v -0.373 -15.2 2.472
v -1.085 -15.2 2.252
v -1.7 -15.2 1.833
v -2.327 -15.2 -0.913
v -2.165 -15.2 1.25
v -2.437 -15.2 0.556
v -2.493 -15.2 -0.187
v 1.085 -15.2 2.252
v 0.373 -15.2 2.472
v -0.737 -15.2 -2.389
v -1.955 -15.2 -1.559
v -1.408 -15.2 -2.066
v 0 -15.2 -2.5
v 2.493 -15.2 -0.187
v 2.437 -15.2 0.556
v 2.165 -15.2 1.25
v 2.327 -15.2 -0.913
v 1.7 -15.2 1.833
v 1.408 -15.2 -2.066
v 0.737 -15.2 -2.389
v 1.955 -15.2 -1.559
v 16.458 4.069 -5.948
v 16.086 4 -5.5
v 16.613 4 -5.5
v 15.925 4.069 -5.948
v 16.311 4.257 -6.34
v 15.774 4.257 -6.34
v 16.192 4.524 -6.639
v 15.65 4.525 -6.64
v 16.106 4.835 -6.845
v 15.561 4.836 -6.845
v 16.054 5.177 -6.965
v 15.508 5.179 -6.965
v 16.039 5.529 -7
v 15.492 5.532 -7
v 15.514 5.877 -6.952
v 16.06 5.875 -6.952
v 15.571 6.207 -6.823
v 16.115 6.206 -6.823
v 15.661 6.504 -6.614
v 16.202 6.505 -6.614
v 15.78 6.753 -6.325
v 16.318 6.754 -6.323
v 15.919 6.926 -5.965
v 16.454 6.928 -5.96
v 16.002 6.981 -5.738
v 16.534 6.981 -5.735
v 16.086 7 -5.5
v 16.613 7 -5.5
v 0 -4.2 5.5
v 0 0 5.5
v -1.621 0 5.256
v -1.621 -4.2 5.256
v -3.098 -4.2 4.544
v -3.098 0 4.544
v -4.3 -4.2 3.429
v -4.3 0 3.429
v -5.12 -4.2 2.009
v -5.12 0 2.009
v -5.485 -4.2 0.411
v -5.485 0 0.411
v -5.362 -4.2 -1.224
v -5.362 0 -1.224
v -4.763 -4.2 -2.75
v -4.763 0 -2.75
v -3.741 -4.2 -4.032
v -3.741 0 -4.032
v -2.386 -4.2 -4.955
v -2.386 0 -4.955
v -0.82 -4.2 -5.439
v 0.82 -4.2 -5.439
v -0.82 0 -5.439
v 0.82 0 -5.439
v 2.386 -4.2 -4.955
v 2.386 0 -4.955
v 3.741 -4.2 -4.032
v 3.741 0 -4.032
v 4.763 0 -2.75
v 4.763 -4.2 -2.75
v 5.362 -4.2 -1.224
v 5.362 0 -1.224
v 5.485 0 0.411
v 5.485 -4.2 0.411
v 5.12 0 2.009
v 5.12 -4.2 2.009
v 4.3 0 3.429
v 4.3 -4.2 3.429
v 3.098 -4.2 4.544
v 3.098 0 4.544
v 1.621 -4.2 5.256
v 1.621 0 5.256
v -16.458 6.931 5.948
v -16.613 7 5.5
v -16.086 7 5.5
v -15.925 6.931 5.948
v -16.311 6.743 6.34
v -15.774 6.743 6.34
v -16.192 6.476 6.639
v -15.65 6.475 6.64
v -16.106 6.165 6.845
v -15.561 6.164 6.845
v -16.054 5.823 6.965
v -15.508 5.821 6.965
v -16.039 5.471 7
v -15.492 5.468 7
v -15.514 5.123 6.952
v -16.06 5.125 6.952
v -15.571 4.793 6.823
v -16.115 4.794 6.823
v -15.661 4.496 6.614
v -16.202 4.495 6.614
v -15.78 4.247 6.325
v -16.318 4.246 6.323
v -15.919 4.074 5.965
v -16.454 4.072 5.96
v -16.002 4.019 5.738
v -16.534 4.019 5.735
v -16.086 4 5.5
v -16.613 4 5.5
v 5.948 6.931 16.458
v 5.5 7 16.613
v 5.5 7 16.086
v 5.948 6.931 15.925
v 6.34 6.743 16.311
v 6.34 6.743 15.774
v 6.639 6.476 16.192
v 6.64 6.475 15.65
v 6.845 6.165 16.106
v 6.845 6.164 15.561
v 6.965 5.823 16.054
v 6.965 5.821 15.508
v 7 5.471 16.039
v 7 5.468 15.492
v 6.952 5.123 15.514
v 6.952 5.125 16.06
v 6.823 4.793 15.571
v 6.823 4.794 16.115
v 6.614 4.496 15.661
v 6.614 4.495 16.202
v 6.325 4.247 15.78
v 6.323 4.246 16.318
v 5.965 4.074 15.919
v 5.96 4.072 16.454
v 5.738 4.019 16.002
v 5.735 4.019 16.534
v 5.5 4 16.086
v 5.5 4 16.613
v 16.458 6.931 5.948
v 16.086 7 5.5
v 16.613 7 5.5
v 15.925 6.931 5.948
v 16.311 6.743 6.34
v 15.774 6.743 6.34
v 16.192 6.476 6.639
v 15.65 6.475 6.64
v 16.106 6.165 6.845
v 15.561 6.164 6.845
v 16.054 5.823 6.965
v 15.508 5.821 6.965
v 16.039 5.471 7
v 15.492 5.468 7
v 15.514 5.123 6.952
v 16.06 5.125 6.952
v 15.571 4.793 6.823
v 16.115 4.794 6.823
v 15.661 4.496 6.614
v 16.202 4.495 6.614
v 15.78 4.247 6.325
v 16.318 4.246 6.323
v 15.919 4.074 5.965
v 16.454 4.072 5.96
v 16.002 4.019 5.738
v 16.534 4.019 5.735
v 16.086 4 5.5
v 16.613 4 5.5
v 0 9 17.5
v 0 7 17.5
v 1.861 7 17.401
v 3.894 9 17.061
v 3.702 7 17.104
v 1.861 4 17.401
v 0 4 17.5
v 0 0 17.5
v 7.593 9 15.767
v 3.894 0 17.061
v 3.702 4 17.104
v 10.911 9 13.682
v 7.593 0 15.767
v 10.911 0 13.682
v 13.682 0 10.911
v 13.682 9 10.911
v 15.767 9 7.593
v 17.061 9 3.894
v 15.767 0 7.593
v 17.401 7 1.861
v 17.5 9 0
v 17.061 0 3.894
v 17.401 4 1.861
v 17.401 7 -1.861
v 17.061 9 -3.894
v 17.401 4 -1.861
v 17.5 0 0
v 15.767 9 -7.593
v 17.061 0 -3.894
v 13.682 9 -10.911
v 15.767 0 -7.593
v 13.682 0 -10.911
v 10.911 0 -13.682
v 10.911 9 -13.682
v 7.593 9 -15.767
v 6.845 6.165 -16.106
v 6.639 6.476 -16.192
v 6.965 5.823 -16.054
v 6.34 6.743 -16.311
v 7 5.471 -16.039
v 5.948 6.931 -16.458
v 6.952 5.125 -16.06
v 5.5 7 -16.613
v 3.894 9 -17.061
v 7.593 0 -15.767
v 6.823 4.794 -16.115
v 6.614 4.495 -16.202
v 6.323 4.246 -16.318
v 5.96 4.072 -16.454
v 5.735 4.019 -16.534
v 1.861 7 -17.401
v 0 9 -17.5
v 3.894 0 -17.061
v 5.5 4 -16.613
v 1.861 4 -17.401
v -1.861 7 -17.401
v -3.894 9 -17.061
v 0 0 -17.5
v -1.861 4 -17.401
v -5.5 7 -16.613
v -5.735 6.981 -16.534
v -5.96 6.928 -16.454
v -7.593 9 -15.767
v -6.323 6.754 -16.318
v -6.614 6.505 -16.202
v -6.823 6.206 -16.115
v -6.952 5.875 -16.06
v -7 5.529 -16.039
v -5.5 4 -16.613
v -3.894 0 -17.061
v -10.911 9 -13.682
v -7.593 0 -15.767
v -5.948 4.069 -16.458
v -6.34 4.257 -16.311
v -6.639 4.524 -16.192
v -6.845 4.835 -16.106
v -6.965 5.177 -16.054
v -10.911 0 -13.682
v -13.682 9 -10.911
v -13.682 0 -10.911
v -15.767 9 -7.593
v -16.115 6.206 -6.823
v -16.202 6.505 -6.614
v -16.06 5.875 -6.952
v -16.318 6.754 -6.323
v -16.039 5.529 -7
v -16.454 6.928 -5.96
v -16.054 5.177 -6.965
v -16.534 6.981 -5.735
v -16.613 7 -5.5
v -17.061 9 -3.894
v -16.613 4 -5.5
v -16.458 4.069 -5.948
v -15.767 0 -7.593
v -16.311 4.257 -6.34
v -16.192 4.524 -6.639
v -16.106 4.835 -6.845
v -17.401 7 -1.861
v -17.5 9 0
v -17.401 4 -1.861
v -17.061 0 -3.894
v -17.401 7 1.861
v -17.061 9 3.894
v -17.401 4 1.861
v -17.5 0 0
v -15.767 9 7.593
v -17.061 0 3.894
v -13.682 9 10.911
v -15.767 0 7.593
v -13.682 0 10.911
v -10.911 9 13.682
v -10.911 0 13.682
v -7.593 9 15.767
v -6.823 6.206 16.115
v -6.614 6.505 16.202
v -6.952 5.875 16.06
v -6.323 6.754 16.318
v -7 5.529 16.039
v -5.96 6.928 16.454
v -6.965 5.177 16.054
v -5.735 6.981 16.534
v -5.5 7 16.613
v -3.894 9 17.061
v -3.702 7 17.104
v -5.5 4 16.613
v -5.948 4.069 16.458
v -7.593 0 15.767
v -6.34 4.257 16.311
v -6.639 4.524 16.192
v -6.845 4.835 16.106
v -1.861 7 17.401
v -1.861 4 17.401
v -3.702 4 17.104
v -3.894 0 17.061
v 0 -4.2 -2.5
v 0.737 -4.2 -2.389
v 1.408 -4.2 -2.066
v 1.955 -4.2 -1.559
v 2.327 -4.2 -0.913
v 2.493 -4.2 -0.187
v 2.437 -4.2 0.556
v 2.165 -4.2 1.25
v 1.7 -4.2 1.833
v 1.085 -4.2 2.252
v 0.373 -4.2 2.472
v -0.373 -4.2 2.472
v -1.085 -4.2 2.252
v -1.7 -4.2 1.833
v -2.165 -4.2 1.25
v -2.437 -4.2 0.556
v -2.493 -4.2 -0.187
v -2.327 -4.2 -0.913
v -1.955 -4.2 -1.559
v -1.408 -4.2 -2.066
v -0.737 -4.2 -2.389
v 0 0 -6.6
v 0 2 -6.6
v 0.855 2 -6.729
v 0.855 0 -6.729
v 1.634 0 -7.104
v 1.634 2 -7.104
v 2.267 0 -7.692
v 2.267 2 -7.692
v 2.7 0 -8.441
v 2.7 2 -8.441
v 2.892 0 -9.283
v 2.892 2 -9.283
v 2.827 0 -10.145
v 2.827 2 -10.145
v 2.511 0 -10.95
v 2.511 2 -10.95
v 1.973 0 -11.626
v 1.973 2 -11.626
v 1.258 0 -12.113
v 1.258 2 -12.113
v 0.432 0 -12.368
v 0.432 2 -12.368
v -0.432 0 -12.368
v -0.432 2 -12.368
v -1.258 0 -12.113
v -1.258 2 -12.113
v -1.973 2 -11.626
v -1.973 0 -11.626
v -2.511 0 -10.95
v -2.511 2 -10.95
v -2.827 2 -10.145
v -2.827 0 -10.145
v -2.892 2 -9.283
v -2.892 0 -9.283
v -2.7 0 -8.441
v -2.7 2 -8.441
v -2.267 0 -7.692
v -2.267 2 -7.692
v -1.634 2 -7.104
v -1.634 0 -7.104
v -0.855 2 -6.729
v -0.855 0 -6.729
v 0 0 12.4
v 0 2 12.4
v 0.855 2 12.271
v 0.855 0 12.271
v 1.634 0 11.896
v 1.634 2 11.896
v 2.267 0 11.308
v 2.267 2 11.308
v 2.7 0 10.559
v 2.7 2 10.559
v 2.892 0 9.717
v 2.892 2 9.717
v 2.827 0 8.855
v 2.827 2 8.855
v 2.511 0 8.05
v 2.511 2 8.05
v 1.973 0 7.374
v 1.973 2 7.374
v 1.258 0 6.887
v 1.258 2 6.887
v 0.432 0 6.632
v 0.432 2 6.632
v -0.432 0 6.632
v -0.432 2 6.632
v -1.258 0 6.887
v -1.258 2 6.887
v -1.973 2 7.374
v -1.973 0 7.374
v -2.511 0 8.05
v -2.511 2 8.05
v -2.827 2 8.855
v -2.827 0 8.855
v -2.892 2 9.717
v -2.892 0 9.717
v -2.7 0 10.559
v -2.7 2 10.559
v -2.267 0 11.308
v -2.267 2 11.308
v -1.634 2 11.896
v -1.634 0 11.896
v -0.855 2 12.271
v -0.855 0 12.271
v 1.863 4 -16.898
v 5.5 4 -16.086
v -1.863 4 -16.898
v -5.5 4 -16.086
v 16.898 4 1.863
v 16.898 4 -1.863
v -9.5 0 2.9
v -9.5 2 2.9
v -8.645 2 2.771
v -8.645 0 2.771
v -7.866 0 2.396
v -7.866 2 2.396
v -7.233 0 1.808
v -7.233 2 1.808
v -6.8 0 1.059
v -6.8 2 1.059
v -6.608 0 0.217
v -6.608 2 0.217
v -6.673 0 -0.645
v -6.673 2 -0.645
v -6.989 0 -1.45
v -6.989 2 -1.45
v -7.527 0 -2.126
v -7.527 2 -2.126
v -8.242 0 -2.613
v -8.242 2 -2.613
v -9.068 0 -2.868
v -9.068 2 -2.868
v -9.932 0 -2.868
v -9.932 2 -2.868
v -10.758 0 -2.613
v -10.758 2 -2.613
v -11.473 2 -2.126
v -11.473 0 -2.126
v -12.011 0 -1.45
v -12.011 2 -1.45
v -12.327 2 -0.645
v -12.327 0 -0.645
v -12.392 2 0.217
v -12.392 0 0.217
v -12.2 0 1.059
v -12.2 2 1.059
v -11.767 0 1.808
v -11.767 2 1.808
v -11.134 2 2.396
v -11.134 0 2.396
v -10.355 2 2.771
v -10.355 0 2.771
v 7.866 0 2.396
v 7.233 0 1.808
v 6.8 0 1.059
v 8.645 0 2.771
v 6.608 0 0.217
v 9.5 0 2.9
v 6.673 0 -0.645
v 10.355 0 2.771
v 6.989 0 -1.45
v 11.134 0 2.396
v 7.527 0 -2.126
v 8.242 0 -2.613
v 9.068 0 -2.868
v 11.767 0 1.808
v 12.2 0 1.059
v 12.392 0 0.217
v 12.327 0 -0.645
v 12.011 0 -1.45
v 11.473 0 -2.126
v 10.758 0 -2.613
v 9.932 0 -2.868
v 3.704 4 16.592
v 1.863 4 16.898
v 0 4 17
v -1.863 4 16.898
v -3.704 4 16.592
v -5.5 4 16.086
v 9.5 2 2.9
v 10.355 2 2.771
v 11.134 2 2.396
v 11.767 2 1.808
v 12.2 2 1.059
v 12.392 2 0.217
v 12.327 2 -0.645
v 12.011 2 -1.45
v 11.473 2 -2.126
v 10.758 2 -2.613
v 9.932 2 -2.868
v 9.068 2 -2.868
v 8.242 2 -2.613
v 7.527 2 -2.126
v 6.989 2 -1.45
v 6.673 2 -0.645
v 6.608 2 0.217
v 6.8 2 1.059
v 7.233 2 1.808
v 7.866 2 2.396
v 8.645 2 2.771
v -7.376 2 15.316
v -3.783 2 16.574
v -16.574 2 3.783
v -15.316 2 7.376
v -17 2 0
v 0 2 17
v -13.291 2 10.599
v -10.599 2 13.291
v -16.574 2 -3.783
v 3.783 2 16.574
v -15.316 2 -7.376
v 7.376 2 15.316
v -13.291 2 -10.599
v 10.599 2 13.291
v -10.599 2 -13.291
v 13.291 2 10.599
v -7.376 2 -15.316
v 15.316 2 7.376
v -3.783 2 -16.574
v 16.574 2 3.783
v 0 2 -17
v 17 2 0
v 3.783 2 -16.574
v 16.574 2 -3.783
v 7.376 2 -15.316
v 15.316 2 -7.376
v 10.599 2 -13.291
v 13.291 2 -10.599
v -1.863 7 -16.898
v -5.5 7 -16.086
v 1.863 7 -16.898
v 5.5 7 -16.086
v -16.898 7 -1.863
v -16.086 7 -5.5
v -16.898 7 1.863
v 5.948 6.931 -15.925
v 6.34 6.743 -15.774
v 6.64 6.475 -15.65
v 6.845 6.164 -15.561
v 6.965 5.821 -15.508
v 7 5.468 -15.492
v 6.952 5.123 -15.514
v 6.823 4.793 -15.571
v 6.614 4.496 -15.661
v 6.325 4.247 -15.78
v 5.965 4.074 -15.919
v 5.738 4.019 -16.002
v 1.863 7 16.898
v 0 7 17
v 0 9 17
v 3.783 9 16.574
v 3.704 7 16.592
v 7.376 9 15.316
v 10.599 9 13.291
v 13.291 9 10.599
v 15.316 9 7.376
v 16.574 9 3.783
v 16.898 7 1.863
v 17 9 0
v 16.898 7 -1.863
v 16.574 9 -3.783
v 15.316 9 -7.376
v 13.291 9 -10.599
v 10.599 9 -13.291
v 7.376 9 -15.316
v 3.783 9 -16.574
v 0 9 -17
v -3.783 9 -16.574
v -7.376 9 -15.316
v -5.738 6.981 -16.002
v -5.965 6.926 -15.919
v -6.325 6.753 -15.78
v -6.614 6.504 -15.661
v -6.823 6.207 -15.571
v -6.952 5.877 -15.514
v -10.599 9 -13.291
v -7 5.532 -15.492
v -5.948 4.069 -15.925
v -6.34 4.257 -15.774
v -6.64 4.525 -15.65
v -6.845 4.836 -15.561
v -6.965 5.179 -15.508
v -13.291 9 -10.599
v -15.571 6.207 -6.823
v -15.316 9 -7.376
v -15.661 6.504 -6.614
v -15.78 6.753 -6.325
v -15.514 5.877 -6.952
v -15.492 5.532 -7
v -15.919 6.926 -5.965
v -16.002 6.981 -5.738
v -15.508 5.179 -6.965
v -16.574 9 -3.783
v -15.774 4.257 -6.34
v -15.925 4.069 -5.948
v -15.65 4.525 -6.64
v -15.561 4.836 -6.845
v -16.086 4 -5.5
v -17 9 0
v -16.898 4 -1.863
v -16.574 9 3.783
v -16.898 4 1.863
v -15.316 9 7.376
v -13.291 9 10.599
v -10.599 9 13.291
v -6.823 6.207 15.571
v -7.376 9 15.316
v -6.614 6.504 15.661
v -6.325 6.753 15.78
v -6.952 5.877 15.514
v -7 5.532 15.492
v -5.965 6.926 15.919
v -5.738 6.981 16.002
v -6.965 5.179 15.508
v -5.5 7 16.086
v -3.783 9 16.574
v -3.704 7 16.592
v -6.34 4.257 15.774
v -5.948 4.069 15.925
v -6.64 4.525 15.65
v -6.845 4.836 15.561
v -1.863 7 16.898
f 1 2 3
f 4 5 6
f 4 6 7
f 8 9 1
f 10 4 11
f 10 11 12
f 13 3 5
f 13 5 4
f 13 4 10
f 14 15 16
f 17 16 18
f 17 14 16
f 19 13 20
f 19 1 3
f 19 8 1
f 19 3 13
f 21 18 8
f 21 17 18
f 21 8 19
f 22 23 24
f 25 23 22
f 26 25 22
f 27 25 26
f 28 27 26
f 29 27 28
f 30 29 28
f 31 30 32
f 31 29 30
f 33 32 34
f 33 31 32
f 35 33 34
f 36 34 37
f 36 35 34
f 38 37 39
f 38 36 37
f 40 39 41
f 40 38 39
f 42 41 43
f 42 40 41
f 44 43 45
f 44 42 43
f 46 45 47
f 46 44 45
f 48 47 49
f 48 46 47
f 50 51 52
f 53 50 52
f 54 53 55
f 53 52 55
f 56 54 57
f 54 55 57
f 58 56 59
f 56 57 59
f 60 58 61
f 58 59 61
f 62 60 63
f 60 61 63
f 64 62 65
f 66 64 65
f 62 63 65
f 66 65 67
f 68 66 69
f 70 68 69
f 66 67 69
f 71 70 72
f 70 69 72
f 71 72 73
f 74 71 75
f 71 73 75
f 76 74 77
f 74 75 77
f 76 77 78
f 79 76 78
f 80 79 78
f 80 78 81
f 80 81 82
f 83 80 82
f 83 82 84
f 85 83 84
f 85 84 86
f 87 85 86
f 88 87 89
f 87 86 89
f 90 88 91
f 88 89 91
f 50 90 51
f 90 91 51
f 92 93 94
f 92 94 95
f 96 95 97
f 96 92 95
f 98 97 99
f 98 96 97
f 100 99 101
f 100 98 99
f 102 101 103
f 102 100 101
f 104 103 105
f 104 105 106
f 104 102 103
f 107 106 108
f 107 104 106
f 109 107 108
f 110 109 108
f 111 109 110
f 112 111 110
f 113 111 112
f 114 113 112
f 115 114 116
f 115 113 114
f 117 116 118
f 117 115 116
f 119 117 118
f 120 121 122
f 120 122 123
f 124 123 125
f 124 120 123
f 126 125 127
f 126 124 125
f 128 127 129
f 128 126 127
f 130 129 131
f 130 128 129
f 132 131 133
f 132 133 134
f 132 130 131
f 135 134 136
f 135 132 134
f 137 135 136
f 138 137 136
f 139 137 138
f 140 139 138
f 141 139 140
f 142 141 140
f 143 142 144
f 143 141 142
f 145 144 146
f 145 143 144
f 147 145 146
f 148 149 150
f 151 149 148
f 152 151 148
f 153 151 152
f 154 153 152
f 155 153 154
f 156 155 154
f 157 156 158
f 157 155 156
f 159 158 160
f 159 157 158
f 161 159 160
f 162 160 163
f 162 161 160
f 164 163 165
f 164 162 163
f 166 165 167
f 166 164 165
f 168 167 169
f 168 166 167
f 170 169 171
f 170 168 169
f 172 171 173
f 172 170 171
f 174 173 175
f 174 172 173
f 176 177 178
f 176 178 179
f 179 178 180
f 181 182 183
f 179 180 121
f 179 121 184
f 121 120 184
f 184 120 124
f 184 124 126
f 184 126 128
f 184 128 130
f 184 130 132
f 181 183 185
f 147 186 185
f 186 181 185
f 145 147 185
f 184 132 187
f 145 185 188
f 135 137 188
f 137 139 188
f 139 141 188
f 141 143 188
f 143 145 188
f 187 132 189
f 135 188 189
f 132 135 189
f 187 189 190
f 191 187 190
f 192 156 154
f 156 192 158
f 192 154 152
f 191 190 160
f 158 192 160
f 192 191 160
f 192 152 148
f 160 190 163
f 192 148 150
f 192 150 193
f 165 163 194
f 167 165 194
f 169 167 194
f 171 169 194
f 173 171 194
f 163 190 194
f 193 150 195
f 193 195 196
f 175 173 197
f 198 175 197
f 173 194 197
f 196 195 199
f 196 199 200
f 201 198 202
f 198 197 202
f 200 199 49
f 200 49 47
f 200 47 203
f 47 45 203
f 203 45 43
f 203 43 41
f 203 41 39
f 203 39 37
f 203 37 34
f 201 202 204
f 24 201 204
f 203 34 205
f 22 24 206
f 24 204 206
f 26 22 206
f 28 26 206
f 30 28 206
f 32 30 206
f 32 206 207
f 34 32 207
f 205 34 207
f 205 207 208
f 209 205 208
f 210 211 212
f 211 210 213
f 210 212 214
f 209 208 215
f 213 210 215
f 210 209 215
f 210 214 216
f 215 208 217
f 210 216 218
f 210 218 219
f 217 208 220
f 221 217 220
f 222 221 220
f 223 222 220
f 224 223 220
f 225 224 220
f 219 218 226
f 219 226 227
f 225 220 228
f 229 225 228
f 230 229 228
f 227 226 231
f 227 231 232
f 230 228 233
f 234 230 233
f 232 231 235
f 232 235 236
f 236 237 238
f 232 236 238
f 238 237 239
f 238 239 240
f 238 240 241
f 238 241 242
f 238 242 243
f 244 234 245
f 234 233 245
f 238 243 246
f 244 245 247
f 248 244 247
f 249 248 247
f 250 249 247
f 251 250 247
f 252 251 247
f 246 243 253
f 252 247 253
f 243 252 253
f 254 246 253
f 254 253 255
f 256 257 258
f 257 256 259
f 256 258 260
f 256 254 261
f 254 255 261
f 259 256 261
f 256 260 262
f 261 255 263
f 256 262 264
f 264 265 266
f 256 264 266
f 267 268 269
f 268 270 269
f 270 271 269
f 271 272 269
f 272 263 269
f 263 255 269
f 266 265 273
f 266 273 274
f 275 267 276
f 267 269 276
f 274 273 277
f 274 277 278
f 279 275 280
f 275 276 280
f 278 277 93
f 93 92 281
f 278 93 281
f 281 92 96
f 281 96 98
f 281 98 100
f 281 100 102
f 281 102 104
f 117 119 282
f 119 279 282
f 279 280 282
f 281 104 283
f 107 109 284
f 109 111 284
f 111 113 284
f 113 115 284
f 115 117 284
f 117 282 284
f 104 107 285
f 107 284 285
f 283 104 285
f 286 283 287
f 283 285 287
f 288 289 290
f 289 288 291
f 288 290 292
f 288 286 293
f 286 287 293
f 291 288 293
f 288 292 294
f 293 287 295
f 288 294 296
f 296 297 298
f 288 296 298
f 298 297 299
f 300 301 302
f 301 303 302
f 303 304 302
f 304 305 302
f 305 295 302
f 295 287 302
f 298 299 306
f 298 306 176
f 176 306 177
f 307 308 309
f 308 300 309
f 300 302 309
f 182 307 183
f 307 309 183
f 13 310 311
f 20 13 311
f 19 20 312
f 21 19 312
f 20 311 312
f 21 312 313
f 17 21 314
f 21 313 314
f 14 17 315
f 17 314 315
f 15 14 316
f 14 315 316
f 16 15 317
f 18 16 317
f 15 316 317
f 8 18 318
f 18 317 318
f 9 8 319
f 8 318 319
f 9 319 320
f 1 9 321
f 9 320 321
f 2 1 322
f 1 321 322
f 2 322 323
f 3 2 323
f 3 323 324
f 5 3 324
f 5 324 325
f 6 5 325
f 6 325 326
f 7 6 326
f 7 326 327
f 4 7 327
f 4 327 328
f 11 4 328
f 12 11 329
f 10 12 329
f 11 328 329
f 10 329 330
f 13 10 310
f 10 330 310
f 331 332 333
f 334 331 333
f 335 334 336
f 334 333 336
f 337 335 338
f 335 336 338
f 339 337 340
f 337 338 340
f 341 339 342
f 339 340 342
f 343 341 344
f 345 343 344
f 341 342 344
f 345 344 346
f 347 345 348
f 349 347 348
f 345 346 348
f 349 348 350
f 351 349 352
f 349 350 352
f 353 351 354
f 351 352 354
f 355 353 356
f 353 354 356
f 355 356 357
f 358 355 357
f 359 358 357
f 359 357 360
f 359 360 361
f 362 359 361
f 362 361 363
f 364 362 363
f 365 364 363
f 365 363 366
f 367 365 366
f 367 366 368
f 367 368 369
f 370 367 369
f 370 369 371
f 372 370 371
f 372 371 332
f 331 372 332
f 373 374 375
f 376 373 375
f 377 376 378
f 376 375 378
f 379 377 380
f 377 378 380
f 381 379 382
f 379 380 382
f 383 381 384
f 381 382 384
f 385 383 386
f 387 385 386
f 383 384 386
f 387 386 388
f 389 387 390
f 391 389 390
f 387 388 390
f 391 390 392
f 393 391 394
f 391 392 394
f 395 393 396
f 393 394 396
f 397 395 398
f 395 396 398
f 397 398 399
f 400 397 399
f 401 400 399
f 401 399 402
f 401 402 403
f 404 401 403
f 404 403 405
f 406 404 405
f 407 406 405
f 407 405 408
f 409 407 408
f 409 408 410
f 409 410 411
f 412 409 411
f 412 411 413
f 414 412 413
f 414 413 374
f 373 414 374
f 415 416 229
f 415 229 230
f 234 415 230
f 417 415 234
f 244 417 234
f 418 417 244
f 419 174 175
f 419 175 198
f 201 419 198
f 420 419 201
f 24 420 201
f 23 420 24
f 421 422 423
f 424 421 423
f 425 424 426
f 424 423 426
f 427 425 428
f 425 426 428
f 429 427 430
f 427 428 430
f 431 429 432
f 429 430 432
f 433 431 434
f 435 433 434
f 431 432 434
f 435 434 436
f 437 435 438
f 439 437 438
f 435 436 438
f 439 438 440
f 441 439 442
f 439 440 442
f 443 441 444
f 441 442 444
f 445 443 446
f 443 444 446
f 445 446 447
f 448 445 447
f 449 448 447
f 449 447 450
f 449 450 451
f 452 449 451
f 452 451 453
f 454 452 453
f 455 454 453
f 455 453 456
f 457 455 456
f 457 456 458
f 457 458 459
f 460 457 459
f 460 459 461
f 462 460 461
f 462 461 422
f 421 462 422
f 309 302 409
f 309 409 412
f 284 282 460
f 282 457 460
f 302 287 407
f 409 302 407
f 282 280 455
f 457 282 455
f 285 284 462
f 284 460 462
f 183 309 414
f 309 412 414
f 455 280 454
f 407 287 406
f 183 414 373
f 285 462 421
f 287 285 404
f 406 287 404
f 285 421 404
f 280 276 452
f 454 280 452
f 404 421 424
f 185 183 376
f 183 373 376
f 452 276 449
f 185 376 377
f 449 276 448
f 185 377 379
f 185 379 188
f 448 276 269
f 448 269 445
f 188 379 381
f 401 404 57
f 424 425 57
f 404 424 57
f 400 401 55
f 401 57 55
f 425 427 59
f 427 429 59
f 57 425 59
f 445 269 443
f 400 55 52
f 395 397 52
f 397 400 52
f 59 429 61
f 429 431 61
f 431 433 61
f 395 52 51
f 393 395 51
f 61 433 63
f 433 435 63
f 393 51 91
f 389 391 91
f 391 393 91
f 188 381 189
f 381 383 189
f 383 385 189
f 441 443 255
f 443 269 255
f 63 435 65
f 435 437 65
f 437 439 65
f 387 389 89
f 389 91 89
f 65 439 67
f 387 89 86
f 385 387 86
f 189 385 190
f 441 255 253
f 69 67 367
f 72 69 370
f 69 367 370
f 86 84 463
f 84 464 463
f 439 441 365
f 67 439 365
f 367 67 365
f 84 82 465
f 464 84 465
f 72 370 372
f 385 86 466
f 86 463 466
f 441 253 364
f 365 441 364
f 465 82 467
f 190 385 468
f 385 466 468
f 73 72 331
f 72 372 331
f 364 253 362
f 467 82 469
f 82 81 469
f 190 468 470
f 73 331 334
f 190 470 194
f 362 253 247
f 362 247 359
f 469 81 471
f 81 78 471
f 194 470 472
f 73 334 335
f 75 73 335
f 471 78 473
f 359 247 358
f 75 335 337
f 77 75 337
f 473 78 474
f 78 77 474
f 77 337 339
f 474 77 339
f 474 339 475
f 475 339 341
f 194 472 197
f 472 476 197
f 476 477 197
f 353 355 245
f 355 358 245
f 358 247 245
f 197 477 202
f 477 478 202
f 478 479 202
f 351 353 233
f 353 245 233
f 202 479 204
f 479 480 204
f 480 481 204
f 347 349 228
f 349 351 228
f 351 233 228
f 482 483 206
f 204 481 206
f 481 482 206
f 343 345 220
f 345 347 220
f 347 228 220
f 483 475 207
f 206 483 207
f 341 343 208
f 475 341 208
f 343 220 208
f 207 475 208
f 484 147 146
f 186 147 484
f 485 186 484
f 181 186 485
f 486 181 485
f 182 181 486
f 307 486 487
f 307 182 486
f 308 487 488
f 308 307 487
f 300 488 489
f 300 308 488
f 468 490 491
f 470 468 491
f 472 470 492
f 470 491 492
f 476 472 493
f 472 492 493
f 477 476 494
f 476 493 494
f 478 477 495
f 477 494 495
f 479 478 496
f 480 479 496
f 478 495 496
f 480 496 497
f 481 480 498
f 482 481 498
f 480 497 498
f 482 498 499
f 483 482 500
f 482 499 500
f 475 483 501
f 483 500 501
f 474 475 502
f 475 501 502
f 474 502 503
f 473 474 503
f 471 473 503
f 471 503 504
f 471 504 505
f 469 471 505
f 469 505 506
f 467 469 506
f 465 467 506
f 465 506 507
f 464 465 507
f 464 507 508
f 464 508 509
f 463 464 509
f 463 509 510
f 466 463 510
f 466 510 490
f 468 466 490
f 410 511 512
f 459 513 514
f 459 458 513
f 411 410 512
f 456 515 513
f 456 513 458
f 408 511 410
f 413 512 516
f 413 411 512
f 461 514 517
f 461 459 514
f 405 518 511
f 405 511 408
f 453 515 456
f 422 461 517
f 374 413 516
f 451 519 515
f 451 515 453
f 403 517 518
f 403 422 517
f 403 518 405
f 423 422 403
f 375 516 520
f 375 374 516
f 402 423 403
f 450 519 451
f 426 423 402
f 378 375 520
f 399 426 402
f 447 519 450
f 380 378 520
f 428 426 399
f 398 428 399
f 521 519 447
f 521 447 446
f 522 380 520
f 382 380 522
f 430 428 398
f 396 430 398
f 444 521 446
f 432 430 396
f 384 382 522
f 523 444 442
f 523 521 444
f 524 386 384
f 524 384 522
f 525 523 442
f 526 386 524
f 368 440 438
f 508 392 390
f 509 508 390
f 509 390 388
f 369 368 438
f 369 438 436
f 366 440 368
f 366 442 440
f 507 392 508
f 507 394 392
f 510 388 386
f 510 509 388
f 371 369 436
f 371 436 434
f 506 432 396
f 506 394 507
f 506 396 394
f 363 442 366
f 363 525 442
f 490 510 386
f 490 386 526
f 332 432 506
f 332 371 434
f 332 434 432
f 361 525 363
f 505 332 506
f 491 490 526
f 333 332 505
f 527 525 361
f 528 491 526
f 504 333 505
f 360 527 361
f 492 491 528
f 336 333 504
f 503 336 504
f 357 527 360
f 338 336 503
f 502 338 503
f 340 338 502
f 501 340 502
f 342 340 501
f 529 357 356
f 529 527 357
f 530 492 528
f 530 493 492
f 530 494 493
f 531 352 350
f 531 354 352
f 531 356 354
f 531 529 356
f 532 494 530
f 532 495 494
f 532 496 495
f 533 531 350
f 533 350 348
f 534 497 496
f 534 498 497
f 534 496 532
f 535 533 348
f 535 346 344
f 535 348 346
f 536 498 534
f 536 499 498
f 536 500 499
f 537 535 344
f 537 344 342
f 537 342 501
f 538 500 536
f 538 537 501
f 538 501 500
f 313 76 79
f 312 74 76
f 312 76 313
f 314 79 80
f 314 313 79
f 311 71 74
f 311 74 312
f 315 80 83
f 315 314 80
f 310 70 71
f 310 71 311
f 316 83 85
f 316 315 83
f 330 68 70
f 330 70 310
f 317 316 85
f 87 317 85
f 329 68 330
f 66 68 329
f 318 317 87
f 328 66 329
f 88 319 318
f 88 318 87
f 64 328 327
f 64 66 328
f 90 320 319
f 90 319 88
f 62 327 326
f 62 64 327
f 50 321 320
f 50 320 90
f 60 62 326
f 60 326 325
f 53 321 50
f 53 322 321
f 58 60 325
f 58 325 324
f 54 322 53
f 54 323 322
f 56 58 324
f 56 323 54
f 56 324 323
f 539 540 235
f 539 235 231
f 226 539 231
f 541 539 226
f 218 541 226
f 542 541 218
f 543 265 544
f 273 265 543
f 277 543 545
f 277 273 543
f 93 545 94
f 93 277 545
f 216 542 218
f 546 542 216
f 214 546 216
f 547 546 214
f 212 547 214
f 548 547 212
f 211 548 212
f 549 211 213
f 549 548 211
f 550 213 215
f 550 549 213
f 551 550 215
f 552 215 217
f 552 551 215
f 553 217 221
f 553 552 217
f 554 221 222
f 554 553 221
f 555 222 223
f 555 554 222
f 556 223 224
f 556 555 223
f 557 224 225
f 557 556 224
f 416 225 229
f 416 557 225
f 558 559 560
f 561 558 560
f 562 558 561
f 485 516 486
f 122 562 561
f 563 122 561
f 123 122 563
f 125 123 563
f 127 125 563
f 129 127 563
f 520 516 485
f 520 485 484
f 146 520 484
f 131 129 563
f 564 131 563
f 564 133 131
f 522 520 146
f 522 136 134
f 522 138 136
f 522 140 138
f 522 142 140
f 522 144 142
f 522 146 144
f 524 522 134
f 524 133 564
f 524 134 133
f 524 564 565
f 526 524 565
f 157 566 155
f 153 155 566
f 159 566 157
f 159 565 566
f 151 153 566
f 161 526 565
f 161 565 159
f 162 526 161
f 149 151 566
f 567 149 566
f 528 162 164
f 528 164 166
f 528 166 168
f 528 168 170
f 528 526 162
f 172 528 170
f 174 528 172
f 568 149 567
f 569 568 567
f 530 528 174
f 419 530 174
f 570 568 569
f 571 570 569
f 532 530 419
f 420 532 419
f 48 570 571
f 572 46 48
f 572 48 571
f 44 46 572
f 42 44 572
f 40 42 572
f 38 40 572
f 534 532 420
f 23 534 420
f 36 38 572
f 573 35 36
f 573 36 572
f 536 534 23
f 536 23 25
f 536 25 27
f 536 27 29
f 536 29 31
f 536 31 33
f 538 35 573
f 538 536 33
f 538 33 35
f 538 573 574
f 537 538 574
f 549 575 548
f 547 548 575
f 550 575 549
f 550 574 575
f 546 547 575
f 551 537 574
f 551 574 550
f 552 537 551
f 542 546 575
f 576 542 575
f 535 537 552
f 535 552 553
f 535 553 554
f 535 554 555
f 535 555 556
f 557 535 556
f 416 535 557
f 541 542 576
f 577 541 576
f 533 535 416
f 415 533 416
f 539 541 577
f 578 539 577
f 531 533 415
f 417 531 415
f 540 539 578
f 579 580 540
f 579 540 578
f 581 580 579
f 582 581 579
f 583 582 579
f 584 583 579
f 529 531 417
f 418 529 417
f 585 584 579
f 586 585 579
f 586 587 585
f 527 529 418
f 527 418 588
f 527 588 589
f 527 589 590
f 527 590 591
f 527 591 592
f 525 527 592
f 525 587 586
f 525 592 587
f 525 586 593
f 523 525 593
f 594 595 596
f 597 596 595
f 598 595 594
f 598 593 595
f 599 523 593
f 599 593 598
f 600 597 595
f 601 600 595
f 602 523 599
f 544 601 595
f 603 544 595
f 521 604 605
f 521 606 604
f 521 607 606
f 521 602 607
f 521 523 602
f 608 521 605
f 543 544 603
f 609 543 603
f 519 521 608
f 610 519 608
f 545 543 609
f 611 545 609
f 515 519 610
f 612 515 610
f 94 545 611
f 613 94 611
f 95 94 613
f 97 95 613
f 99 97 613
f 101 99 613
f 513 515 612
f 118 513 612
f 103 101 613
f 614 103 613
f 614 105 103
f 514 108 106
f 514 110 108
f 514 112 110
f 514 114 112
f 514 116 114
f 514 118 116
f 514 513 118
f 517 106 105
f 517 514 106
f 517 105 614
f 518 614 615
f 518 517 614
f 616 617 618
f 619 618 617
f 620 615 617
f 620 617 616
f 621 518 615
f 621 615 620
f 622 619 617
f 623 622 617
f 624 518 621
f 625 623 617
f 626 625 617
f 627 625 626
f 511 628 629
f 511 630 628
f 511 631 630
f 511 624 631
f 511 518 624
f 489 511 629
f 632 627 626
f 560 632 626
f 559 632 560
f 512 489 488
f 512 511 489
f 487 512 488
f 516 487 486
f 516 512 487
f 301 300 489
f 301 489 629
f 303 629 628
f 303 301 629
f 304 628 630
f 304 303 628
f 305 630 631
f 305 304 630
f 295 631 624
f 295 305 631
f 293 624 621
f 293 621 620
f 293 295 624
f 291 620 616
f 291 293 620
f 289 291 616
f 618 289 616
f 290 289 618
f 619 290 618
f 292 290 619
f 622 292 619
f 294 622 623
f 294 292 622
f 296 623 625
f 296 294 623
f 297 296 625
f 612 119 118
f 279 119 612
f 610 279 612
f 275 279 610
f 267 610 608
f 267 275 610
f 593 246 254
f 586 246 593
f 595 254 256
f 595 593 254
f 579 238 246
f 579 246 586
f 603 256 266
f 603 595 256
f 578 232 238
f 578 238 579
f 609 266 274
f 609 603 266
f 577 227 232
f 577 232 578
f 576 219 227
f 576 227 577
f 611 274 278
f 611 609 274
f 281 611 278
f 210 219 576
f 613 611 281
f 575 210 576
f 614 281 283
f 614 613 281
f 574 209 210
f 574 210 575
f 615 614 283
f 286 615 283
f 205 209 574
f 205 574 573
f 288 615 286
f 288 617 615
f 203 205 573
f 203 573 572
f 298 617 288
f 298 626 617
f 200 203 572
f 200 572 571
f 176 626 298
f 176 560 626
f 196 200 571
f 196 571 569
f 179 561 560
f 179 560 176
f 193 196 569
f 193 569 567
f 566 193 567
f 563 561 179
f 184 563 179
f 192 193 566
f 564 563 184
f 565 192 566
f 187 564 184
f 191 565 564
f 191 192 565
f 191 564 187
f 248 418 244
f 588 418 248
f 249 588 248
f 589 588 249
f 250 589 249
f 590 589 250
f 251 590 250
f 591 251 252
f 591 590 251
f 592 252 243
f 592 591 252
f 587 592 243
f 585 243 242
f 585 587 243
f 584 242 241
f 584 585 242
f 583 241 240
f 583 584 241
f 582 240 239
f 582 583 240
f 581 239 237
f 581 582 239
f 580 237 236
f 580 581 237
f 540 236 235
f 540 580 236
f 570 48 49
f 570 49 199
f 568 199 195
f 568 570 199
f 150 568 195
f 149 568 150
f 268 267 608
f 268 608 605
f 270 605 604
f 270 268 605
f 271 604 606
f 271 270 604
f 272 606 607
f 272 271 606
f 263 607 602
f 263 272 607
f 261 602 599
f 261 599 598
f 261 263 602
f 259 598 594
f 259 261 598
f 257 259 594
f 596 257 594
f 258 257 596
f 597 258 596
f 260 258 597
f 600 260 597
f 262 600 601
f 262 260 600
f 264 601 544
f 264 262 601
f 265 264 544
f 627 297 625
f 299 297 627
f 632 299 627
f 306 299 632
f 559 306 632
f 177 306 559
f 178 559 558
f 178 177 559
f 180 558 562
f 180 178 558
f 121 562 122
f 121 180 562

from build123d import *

# Parameters (mm, degrees)
IZIM1_R                     = 17.5
IZIM1_R_2                   = 17
Y_KSEKLIK_EKSTR_ZYON1_DEPTH = 9
KAL_NLA_T_R1_OUTLINE_R      = 17
KAL_NLA_T_R1_DEPTH          = 2
IZIM2_R                     = 2.9
KES_EKSTR_ZYON1_DEPTH       = 9
KES_EKSTR_ZYON5_DEPTH       = 43.349734356
DAIRESEL_KAPLAMA1_COUNT     = 2
DAIRESEL_KAPLAMA1_ANGLE     = 90
IZIM4_R                     = 5.5
Y_KSEKLIK_EKSTR_ZYON2_DEPTH = 4.2
IZIM5_R                     = 2.5
Y_KSEKLIK_EKSTR_ZYON3_DEPTH = 11


# Read off the part's stored shape, not the designer's step: Kalınlaştır1
with BuildPart() as part:
    # Çizim1 → Yükseklik-Ekstrüzyon1 (new body)
    with BuildSketch(Plane(origin=(0, 0, 0), x_dir=(1, 0, 0), z_dir=(0, 1, 0))):
        with Locations(Location((0, 0, 0), (0, 0, 270))):
            Circle(IZIM1_R)
        with Locations(Location((0, 0, 0), (0, 0, 270))):
            Circle(IZIM1_R_2, mode=Mode.SUBTRACT)
    extrude(amount=Y_KSEKLIK_EKSTR_ZYON1_DEPTH)

    # Kalınlaştır1 outline → Kalınlaştır1 (add)
    with BuildSketch(Plane(origin=(0, 0, 0), x_dir=(1, 0, 0), z_dir=(0, 1, 0))):
        Circle(KAL_NLA_T_R1_OUTLINE_R)
    extrude(amount=KAL_NLA_T_R1_DEPTH)

    # Çizim2 → Kes-Ekstrüzyon1 (cut)
    with BuildSketch(Plane(origin=(0, 2, 0), x_dir=(1, 0, 0), z_dir=(0, 1, 0))):
        with Locations(Location((-9.5, 0, 0), (0, 0, 270))):
            Circle(IZIM2_R)
        with Locations(Location((0, 9.5, 0), (0, 0, 270))):
            Circle(IZIM2_R)
        with Locations(Location((9.5, 0, 0), (0, 0, 270))):
            Circle(IZIM2_R)
        with Locations(Location((0, -9.5, 0), (0, 0, 270))):
            Circle(IZIM2_R)
    extrude(amount=-KES_EKSTR_ZYON1_DEPTH, mode=Mode.SUBTRACT)

    # Çizim3 → Kes-Ekstrüzyon5 (cut, symmetric)
    with BuildSketch(Plane.ZY.offset(-20)):
        with BuildLine():
            Line((-5.5, 7), (5.5, 7))
            ThreePointArc((5.5, 7), (7, 5.5), (5.5, 4))
            Line((5.5, 4), (-5.5, 4))
            ThreePointArc((-5.5, 4), (-7, 5.5), (-5.5, 7))
        make_face()
    kes_ekstr_zyon5 = extrude(amount=KES_EKSTR_ZYON5_DEPTH, both=True, mode=Mode.SUBTRACT)

    # Dairesel Kaplama1: Kes-Ekstrüzyon5 ×2 about axis
    dairesel_kaplama1_axis = Axis((0, 2, 0), (0, 1, 0))
    for i in range(1, DAIRESEL_KAPLAMA1_COUNT):
        add(kes_ekstr_zyon5.rotate(dairesel_kaplama1_axis, i * DAIRESEL_KAPLAMA1_ANGLE / (DAIRESEL_KAPLAMA1_COUNT - 1)), mode=Mode.SUBTRACT)

    # Çizim4 → Yükseklik-Ekstrüzyon2 (add)
    with BuildSketch(Plane.XZ):
        with Locations(Location((0, 0, 0), (0, 0, 90))):
            Circle(IZIM4_R)
    extrude(amount=Y_KSEKLIK_EKSTR_ZYON2_DEPTH)

    # Çizim5 → Yükseklik-Ekstrüzyon3 (add)
    with BuildSketch(Plane.XZ.offset(4.2)):
        with Locations(Location((0, 0, 0), (0, 0, 270))):
            Circle(IZIM5_R)
    extrude(amount=Y_KSEKLIK_EKSTR_ZYON3_DEPTH)


solid = part.part
